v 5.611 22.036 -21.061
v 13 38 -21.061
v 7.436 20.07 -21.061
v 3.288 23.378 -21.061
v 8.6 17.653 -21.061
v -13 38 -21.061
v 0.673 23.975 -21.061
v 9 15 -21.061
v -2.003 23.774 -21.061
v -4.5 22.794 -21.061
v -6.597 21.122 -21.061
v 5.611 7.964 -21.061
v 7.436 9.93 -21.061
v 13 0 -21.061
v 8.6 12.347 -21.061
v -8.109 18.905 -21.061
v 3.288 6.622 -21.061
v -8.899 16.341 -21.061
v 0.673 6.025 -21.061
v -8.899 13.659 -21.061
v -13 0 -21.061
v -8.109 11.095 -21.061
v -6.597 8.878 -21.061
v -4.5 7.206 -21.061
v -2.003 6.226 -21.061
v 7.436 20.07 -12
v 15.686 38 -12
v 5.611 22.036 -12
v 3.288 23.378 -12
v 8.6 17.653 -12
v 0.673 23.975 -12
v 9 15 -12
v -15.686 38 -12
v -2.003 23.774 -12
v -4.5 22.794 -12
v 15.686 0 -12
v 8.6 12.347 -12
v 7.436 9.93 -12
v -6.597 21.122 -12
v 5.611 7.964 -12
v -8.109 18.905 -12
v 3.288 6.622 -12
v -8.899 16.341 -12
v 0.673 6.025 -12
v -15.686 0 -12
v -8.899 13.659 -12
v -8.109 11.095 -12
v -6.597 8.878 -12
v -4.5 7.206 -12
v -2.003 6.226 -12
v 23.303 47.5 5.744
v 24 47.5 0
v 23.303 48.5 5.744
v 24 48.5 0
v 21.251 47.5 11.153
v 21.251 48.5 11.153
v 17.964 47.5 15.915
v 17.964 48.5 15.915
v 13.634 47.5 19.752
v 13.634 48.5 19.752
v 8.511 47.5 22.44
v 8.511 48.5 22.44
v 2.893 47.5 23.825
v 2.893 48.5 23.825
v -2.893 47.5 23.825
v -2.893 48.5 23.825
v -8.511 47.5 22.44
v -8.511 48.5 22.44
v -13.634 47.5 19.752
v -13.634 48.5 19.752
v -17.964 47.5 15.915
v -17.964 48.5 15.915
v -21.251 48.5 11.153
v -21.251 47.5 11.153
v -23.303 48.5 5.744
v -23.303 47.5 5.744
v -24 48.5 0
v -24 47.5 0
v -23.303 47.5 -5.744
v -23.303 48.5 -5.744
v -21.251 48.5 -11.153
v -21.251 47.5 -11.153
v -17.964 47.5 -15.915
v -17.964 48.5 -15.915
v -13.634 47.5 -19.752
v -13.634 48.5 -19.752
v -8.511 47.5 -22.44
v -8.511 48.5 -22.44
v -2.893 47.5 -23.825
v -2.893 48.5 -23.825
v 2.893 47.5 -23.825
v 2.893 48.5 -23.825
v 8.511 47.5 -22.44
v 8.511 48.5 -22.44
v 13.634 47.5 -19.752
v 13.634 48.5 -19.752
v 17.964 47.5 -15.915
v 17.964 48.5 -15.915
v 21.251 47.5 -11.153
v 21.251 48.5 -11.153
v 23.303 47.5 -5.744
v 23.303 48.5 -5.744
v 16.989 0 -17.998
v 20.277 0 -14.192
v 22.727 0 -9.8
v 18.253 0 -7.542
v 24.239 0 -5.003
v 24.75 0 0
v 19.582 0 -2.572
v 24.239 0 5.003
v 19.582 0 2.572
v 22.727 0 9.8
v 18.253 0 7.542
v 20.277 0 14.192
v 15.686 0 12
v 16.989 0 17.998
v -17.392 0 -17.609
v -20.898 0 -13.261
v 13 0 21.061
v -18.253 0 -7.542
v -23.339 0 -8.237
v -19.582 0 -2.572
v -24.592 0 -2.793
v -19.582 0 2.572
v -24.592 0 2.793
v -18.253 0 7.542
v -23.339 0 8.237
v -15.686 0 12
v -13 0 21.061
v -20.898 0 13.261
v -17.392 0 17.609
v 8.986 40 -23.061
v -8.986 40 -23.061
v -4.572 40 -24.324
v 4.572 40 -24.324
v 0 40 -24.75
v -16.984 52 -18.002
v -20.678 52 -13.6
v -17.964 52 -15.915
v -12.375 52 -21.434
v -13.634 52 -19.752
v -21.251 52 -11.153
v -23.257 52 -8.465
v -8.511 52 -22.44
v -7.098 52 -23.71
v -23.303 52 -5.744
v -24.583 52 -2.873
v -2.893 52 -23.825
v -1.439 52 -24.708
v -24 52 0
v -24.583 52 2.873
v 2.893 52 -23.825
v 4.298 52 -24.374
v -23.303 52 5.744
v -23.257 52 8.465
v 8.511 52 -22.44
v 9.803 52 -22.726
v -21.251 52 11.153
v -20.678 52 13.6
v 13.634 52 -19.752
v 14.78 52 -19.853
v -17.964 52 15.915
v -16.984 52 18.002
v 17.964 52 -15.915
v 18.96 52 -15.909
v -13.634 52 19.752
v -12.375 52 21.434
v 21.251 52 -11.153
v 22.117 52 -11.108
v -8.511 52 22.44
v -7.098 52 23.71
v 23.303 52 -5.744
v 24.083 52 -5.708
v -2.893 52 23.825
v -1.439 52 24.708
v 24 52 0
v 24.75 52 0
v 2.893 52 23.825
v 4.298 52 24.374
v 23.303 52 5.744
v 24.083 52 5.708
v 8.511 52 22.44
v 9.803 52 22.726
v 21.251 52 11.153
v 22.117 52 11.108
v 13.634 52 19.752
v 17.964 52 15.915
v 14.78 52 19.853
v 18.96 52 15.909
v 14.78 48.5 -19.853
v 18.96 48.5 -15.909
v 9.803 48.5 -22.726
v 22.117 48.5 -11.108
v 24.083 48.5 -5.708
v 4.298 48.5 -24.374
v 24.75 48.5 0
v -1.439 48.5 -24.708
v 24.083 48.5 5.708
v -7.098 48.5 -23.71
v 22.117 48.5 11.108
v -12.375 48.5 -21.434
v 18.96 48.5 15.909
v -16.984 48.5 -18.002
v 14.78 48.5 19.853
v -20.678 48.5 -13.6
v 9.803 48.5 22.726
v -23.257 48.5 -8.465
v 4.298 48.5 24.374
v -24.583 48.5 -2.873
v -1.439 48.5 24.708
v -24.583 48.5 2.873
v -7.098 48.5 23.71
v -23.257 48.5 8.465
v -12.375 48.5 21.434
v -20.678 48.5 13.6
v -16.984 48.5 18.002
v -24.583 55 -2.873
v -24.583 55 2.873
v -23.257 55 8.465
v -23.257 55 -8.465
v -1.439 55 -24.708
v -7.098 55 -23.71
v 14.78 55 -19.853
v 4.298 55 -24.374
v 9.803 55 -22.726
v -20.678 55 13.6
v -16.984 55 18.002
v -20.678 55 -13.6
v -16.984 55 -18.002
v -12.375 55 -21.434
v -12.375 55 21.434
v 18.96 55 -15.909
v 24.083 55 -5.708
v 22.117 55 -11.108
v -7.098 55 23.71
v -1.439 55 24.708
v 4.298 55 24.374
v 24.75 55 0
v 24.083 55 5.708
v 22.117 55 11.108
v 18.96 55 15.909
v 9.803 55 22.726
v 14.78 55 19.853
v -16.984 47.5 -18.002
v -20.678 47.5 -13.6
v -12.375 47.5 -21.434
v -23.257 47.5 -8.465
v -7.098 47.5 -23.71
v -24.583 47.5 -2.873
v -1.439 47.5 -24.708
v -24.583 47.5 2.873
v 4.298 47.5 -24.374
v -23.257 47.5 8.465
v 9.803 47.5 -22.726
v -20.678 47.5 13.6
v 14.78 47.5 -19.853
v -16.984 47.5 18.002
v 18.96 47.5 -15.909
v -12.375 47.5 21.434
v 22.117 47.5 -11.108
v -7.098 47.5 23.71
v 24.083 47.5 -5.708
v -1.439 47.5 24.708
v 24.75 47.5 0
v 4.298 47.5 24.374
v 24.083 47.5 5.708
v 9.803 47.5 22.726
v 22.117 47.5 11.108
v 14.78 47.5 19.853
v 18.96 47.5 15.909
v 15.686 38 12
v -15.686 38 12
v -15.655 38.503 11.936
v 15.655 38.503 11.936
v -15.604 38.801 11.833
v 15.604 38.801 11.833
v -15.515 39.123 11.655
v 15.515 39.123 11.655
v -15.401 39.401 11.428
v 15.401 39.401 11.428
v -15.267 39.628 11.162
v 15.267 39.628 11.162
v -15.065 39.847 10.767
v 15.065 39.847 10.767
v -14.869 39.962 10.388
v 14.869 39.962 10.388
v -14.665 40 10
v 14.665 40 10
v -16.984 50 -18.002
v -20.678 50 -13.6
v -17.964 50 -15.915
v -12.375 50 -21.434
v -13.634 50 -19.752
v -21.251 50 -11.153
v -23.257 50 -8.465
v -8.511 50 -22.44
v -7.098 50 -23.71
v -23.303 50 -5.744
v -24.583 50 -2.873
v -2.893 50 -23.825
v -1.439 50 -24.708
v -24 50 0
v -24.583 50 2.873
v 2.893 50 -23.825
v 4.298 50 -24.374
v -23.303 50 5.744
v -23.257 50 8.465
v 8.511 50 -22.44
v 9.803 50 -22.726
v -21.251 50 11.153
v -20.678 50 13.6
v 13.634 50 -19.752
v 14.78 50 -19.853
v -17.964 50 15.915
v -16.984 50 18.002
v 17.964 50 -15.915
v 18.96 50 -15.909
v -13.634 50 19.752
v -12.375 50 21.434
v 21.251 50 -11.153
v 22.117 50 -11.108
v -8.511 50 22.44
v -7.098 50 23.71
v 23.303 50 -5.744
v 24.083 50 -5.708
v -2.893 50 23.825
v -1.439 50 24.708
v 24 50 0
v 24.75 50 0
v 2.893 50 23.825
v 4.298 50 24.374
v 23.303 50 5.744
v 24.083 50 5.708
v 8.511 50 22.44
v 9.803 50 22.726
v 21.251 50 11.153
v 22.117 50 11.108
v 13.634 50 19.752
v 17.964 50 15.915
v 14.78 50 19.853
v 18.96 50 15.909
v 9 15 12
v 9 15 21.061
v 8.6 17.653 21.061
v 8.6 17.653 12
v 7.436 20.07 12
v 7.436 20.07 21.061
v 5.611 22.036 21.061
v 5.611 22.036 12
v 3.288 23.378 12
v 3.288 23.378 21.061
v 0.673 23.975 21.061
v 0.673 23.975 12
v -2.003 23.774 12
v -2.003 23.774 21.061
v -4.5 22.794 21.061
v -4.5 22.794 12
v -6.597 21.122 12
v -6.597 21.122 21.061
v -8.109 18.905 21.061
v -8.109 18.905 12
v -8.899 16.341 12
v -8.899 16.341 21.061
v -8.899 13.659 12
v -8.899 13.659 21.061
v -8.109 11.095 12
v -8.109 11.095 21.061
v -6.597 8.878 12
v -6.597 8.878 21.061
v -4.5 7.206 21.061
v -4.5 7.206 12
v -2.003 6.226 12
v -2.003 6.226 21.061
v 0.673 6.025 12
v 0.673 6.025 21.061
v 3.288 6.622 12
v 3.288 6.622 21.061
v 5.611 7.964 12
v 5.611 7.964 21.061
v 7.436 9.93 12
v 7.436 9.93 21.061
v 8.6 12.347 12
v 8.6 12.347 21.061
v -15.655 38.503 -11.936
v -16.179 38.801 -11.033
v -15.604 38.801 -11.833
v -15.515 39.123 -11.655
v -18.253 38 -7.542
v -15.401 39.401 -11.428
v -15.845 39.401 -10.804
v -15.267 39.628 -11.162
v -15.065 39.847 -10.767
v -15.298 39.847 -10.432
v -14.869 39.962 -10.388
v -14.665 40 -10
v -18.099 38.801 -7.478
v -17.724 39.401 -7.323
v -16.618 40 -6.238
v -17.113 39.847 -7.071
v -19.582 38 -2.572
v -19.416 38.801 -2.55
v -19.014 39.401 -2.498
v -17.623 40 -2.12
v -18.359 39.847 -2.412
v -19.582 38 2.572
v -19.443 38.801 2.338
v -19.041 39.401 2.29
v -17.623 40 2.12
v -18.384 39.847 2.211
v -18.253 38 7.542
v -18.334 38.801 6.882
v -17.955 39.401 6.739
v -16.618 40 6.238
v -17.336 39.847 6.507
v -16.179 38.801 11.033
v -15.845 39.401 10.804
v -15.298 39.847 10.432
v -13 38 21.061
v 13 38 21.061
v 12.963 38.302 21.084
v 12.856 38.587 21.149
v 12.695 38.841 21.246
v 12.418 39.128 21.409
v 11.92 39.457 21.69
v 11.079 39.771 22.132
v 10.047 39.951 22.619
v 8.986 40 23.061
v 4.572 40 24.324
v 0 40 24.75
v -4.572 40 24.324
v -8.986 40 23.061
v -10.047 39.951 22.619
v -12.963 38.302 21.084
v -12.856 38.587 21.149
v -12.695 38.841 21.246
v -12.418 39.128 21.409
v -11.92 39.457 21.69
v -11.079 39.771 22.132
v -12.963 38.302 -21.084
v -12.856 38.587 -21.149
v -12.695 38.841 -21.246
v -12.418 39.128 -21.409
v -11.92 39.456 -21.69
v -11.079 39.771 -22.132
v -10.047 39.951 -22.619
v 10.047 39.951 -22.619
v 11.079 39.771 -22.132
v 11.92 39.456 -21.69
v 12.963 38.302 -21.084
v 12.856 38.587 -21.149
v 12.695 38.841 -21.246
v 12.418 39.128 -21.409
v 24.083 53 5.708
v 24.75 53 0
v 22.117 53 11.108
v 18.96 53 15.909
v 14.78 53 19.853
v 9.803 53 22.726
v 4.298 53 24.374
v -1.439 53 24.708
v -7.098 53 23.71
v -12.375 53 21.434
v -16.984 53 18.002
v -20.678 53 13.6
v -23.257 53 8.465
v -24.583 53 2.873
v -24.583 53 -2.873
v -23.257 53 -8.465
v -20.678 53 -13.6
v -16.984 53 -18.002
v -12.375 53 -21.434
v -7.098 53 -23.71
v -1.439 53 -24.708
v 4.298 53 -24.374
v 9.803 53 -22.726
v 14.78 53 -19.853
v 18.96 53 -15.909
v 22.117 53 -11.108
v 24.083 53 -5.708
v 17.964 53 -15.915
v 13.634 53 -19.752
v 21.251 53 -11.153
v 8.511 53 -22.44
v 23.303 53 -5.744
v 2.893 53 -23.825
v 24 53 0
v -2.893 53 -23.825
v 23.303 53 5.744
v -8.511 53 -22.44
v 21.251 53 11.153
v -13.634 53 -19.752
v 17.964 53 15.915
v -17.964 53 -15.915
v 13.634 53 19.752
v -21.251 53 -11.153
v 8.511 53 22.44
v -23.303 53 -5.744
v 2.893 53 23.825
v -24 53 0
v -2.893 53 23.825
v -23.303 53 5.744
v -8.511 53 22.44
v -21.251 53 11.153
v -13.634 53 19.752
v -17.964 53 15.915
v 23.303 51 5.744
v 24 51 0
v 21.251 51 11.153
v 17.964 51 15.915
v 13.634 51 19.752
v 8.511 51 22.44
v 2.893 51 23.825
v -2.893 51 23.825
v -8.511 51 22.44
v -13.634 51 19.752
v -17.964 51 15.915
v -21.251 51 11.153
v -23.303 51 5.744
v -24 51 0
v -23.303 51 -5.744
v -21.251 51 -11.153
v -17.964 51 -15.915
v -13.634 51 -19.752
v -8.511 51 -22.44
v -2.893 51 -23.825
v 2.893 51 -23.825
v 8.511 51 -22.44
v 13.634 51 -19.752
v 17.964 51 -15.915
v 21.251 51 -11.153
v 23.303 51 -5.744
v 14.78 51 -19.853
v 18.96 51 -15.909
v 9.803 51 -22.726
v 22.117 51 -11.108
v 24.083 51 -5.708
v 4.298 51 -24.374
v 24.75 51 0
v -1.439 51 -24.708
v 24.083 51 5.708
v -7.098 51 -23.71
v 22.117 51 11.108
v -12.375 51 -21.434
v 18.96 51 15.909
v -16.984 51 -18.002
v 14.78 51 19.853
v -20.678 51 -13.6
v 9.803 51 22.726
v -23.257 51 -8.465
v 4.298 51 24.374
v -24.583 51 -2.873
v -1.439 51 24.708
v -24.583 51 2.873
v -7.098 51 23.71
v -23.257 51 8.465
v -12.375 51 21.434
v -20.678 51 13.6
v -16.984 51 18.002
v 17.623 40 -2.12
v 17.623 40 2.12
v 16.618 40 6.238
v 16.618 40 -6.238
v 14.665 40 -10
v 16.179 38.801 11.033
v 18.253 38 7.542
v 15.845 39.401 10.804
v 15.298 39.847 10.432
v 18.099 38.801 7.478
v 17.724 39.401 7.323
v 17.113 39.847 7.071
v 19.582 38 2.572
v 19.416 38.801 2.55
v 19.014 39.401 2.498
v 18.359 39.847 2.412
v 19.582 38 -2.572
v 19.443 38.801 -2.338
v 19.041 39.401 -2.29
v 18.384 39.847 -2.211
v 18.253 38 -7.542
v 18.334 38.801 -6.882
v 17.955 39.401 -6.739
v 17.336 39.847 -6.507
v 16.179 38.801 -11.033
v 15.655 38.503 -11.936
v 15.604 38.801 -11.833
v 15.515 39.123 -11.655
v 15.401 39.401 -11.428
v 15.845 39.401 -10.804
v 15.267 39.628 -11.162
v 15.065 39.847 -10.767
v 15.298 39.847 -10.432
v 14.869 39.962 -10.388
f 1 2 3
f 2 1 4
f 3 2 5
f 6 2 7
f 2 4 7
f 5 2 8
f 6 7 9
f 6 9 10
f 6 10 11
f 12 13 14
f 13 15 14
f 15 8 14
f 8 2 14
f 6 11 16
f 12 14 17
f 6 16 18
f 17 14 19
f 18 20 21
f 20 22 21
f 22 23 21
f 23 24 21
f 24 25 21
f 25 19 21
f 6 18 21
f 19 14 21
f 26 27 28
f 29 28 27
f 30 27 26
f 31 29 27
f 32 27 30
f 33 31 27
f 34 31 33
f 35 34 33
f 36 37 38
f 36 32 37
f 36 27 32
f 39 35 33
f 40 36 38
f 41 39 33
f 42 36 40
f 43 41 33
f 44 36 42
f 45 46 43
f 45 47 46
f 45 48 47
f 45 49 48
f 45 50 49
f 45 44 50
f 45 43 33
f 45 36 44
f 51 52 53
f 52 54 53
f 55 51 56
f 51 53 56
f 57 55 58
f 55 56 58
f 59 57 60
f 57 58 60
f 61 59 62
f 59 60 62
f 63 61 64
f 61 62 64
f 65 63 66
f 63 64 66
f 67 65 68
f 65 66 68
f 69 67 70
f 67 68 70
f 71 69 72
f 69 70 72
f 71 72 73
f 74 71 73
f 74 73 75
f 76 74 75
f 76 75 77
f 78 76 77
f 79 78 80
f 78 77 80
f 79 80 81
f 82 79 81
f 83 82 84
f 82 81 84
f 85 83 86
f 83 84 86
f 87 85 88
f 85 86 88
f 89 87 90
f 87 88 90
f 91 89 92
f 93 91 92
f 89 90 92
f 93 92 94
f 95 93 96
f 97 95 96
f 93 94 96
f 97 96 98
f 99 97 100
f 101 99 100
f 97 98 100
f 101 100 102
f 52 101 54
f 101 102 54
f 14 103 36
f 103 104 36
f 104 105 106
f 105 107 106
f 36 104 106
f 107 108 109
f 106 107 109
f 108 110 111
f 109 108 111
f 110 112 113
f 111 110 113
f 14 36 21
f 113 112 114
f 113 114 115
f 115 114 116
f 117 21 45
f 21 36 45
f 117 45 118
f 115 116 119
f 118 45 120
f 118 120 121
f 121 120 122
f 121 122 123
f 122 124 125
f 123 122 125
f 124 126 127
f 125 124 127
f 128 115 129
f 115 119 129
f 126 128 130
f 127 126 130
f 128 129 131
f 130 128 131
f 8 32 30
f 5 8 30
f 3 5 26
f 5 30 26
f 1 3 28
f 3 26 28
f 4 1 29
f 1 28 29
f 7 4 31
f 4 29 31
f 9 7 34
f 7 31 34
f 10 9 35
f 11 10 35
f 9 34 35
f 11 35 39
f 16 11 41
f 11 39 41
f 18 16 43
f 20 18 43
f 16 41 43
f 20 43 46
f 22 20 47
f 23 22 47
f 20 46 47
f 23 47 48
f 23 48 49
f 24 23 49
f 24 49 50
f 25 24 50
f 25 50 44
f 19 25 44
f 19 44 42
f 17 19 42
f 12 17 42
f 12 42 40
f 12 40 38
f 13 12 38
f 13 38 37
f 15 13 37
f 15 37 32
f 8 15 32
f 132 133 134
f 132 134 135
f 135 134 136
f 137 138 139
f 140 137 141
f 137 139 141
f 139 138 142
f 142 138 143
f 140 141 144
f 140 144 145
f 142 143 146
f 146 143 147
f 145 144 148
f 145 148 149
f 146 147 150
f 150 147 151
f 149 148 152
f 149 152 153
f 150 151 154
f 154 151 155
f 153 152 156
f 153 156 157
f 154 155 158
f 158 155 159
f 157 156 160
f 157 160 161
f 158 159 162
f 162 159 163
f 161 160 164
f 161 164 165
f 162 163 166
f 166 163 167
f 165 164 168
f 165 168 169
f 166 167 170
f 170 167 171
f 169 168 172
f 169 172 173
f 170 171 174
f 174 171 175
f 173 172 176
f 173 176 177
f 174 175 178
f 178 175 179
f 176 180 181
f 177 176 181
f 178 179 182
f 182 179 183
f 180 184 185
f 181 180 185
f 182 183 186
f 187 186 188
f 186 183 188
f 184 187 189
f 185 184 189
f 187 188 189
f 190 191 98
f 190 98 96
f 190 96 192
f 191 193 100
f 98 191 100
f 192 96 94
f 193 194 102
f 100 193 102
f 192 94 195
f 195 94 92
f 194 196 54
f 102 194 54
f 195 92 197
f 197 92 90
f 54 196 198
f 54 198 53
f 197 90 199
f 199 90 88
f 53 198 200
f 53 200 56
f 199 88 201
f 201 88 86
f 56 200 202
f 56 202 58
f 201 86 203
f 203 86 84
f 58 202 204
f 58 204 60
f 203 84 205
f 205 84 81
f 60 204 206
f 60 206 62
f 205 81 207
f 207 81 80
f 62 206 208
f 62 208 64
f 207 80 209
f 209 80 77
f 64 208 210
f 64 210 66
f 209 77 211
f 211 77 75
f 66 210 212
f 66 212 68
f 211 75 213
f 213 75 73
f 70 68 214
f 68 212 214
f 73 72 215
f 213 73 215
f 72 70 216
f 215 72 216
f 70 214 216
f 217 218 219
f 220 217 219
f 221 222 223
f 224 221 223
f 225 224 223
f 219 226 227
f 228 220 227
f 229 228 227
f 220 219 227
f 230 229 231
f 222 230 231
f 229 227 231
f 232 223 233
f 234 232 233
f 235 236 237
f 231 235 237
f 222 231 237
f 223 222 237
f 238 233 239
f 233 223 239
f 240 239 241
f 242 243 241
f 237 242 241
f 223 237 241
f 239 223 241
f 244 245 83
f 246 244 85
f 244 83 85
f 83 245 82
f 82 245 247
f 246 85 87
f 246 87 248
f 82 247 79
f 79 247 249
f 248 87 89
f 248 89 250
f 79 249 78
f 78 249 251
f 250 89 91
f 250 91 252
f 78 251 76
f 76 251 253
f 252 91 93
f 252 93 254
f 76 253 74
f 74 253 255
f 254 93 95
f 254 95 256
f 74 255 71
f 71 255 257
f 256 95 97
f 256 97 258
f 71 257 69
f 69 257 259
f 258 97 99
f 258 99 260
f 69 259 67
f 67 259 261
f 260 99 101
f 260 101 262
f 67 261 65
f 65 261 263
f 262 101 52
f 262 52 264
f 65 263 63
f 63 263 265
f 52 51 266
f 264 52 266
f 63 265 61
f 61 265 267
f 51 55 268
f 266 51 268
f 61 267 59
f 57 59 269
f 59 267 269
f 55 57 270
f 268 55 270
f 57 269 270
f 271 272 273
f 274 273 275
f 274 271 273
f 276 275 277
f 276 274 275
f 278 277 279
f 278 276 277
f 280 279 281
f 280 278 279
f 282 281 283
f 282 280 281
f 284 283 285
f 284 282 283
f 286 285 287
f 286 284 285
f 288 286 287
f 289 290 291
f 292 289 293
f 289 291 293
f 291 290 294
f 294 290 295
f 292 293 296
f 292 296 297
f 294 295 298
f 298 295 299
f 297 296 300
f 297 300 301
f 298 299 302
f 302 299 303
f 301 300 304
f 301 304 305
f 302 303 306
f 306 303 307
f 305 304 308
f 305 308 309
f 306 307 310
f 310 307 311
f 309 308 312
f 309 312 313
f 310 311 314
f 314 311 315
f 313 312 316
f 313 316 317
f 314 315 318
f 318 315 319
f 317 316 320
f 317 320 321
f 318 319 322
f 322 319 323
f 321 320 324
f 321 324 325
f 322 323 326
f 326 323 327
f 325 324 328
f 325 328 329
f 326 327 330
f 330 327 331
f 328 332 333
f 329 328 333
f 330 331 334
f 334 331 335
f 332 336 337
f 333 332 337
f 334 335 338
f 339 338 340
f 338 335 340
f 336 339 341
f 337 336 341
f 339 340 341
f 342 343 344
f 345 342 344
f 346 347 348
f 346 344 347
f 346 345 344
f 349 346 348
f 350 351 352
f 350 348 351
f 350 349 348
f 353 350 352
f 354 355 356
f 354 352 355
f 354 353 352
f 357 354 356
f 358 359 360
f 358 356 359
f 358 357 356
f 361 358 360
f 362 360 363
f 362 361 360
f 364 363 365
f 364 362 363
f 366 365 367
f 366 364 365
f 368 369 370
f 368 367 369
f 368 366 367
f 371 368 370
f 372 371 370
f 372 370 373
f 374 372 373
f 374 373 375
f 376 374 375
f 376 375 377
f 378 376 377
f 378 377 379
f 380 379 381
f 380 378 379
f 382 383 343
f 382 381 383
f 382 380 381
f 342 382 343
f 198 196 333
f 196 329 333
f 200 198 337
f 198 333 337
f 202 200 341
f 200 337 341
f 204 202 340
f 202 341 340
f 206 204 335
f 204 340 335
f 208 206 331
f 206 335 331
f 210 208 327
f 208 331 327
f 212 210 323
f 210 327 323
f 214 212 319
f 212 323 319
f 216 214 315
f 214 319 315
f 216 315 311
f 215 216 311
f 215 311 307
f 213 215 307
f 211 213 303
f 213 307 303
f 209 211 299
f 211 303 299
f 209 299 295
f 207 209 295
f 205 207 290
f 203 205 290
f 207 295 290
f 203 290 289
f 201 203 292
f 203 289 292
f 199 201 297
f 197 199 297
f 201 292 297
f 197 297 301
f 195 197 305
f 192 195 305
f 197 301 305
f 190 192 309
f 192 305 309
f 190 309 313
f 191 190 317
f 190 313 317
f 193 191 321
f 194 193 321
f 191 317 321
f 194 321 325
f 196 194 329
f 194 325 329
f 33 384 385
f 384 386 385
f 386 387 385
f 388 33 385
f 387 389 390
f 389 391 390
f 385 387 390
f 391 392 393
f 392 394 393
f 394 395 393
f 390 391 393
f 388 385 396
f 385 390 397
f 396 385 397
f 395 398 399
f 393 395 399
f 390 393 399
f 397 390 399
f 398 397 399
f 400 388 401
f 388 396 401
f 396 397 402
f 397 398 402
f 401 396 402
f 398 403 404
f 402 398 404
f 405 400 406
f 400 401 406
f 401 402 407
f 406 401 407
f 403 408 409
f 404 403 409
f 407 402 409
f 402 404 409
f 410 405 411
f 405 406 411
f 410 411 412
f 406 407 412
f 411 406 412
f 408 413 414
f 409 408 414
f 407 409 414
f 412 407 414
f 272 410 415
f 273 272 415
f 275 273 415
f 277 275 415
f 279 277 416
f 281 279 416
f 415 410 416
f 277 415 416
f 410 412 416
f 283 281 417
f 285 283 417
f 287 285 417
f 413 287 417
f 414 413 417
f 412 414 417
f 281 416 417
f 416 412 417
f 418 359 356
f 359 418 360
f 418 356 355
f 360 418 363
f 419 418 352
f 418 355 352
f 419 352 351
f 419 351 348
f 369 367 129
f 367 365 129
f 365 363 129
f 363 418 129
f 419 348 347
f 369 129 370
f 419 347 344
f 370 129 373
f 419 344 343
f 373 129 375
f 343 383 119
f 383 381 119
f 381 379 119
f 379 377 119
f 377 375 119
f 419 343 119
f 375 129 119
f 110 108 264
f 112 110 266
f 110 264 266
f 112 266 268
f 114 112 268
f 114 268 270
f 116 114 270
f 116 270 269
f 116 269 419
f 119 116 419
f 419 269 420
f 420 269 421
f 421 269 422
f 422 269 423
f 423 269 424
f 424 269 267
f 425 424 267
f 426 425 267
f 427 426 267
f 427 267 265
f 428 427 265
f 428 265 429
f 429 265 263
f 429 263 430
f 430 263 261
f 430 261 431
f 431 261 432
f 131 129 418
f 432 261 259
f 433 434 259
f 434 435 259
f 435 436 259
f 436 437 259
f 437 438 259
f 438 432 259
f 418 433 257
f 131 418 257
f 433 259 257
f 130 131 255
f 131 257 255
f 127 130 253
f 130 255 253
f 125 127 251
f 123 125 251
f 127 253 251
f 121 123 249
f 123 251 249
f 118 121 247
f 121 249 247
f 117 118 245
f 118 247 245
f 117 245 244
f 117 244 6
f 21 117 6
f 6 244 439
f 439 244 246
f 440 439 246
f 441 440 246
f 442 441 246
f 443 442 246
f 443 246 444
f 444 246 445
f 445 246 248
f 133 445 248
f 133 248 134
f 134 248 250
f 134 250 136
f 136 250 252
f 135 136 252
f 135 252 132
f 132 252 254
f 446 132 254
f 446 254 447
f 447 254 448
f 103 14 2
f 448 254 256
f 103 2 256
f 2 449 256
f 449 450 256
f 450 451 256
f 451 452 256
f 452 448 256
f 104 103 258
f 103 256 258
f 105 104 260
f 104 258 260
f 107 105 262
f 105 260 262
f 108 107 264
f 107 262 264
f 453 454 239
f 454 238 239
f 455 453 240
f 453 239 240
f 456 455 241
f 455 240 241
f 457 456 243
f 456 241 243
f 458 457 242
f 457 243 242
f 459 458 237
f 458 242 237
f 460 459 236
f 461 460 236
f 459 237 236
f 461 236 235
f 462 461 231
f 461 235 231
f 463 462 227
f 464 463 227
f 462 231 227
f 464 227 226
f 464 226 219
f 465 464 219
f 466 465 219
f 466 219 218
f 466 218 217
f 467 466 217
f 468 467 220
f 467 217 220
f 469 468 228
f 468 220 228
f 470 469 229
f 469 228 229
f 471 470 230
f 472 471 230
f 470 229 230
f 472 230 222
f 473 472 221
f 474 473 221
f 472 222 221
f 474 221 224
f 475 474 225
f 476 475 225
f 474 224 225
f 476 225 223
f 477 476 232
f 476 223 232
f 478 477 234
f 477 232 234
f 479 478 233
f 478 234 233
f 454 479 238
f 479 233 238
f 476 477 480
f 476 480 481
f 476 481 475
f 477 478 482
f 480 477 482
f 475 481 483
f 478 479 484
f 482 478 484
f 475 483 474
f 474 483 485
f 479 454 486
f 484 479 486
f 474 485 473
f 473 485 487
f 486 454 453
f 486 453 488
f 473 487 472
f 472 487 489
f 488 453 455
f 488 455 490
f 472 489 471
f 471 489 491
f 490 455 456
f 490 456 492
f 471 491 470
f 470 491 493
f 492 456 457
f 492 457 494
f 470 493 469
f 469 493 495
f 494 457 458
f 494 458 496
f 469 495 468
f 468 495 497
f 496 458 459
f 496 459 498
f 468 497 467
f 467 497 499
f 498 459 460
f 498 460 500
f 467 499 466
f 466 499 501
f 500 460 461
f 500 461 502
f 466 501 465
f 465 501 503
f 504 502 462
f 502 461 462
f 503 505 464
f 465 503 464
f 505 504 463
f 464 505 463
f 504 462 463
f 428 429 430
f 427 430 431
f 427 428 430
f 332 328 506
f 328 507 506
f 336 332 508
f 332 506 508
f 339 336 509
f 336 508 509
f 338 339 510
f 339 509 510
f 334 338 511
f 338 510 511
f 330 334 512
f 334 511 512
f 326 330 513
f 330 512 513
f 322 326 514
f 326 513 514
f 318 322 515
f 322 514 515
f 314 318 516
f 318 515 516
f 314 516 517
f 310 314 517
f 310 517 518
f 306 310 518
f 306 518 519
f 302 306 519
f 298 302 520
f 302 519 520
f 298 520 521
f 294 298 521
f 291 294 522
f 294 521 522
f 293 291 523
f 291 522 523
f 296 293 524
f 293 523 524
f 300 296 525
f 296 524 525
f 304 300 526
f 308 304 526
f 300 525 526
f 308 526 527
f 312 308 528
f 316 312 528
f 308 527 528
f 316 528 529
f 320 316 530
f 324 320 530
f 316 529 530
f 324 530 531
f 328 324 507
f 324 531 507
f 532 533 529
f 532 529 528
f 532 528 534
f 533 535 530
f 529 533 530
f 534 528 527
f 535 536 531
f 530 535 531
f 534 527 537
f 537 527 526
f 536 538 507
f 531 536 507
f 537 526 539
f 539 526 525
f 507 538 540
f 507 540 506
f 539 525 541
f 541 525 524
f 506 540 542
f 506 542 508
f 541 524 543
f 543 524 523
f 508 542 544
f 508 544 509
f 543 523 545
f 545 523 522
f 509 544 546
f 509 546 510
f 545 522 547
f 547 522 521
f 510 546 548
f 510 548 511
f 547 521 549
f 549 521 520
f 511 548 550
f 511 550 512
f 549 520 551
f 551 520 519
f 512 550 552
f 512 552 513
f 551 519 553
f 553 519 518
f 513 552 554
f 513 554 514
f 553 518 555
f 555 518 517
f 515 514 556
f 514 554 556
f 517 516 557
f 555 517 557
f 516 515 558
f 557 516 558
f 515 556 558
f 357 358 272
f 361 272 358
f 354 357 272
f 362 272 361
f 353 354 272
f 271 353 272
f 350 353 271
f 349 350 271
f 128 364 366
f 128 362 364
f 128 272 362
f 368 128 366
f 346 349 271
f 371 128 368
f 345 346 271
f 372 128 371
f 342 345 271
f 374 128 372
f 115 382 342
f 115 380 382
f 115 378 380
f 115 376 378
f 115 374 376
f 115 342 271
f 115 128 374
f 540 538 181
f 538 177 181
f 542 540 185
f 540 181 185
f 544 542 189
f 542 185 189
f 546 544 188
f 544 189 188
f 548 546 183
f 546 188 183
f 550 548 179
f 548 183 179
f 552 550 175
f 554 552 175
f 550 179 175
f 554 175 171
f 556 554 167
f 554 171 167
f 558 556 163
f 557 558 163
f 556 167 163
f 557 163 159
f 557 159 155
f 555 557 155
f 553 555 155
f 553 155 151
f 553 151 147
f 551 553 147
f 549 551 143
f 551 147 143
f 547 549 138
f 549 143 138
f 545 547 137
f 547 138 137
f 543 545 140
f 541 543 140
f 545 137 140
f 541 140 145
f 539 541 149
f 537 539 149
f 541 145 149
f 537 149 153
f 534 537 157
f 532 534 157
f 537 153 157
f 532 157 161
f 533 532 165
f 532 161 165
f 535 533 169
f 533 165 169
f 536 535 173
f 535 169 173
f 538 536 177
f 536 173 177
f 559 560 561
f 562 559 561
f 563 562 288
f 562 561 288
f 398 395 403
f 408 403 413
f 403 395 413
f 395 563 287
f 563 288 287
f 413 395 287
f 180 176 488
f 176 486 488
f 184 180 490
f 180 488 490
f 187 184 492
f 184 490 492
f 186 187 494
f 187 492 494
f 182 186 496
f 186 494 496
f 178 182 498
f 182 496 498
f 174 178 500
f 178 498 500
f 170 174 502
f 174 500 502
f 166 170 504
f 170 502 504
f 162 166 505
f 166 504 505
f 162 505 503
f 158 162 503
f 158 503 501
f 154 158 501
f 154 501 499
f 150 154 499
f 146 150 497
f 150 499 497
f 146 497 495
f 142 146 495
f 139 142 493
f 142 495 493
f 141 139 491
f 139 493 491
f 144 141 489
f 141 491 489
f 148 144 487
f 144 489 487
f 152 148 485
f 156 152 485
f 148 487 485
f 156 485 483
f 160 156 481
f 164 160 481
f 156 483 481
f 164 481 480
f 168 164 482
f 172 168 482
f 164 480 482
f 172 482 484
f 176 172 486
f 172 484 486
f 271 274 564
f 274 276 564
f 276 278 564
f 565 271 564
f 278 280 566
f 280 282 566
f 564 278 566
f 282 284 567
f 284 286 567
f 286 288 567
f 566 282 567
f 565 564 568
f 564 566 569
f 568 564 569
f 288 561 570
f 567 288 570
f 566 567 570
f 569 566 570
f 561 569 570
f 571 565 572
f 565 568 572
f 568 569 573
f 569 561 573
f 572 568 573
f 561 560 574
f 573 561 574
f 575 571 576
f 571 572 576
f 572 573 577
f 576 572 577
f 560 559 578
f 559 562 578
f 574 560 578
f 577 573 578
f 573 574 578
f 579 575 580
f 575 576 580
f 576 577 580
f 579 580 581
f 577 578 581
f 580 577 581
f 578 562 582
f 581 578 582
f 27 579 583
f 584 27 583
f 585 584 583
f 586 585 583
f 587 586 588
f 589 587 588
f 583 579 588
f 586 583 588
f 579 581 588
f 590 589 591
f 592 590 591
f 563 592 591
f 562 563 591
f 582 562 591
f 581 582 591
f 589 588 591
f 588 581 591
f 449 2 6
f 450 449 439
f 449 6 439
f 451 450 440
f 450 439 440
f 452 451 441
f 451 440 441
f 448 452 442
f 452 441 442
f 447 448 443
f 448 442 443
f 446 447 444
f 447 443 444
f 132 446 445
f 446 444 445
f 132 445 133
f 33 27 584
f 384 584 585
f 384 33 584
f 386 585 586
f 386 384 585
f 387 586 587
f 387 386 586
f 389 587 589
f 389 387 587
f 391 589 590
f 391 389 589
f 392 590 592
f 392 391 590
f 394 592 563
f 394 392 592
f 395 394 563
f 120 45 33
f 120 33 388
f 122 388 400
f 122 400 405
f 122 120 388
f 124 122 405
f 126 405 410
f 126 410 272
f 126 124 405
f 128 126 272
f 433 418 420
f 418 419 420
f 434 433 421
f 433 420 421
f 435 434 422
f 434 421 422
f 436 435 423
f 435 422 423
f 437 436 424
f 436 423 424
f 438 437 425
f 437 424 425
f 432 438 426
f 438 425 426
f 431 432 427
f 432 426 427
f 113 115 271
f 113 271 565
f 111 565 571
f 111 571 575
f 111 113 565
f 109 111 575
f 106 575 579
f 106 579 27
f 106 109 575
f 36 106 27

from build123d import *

# Parameters (mm, degrees)
SKICA3_R                      = 9
ODEBRAT_VYSUNUT_M1_DEPTH      = 25.75
ODEBRAT_VYSUNUT_M1_DEPTH_BACK = 25.75
ODEBRAT_VYSUNUT_M2_DEPTH      = 40
ZAOBLIT1_R                    = 2


with BuildPart() as part:
    # Skica2 → Rotovat1 (revolve)
    with BuildSketch(Plane.XY):
        Polygon((0, 0), (24.75, 0), (24.75, 47.5), (24, 47.5), (24, 48.5), (24.75, 48.5), (24.75, 50), (24, 50), (24, 51), (24.75, 51), (24.75, 52), (24, 52), (24, 53), (24.75, 53), (24.75, 55), (0, 55), align=None)
    revolve(axis=Axis((0, 49.551771463, 0), (0, -1, 0)))

    # Skica3 → Odebrat vysunutím1 (cut, two sides)
    with BuildSketch(Plane.XY) as odebrat_vysunut_m1_sk:
        with Locations((0, 15)):
            Circle(SKICA3_R)
    extrude(amount=ODEBRAT_VYSUNUT_M1_DEPTH, mode=Mode.SUBTRACT)
    extrude(odebrat_vysunut_m1_sk.sketch, amount=-ODEBRAT_VYSUNUT_M1_DEPTH_BACK, mode=Mode.SUBTRACT)

    # Skica4 → Odebrat vysunutím2 (cut)
    with BuildSketch(Plane.XZ):
        with BuildLine():
            Line((-13, 21.060923532), (13, 21.060923532))
            ThreePointArc((13, 21.060923532), (0, 24.75), (-13, 21.060923532))
        make_face()
        with BuildLine():
            ThreePointArc((15.686379442, 12), (19.75, 0), (15.686379442, -12))
            Line((15.686379442, -12), (-15.686379442, -12))
            ThreePointArc((-15.686379442, -12), (-19.75, 0), (-15.686379442, 12))
            Line((-15.686379442, 12), (15.686379442, 12))
        make_face()
        with BuildLine():
            Line((13, -21.060923532), (-13, -21.060923532))
            ThreePointArc((-13, -21.060923532), (0, -24.75), (13, -21.060923532))
        make_face()
    extrude(amount=-ODEBRAT_VYSUNUT_M2_DEPTH, mode=Mode.SUBTRACT)

    # Zaoblit1
    zaoblit1_edges = [part.edges().sort_by_distance(p)[0] for p in [
        (0, 40, 21.060923532),
        (0, 40, -12),
        (0, 40, 12),
        (19.75, 40, 0),
        (-19.75, 40, 0),
        (0, 40, -21.060923532),
    ]]
    fillet(zaoblit1_edges, radius=ZAOBLIT1_R)


solid = part.part
